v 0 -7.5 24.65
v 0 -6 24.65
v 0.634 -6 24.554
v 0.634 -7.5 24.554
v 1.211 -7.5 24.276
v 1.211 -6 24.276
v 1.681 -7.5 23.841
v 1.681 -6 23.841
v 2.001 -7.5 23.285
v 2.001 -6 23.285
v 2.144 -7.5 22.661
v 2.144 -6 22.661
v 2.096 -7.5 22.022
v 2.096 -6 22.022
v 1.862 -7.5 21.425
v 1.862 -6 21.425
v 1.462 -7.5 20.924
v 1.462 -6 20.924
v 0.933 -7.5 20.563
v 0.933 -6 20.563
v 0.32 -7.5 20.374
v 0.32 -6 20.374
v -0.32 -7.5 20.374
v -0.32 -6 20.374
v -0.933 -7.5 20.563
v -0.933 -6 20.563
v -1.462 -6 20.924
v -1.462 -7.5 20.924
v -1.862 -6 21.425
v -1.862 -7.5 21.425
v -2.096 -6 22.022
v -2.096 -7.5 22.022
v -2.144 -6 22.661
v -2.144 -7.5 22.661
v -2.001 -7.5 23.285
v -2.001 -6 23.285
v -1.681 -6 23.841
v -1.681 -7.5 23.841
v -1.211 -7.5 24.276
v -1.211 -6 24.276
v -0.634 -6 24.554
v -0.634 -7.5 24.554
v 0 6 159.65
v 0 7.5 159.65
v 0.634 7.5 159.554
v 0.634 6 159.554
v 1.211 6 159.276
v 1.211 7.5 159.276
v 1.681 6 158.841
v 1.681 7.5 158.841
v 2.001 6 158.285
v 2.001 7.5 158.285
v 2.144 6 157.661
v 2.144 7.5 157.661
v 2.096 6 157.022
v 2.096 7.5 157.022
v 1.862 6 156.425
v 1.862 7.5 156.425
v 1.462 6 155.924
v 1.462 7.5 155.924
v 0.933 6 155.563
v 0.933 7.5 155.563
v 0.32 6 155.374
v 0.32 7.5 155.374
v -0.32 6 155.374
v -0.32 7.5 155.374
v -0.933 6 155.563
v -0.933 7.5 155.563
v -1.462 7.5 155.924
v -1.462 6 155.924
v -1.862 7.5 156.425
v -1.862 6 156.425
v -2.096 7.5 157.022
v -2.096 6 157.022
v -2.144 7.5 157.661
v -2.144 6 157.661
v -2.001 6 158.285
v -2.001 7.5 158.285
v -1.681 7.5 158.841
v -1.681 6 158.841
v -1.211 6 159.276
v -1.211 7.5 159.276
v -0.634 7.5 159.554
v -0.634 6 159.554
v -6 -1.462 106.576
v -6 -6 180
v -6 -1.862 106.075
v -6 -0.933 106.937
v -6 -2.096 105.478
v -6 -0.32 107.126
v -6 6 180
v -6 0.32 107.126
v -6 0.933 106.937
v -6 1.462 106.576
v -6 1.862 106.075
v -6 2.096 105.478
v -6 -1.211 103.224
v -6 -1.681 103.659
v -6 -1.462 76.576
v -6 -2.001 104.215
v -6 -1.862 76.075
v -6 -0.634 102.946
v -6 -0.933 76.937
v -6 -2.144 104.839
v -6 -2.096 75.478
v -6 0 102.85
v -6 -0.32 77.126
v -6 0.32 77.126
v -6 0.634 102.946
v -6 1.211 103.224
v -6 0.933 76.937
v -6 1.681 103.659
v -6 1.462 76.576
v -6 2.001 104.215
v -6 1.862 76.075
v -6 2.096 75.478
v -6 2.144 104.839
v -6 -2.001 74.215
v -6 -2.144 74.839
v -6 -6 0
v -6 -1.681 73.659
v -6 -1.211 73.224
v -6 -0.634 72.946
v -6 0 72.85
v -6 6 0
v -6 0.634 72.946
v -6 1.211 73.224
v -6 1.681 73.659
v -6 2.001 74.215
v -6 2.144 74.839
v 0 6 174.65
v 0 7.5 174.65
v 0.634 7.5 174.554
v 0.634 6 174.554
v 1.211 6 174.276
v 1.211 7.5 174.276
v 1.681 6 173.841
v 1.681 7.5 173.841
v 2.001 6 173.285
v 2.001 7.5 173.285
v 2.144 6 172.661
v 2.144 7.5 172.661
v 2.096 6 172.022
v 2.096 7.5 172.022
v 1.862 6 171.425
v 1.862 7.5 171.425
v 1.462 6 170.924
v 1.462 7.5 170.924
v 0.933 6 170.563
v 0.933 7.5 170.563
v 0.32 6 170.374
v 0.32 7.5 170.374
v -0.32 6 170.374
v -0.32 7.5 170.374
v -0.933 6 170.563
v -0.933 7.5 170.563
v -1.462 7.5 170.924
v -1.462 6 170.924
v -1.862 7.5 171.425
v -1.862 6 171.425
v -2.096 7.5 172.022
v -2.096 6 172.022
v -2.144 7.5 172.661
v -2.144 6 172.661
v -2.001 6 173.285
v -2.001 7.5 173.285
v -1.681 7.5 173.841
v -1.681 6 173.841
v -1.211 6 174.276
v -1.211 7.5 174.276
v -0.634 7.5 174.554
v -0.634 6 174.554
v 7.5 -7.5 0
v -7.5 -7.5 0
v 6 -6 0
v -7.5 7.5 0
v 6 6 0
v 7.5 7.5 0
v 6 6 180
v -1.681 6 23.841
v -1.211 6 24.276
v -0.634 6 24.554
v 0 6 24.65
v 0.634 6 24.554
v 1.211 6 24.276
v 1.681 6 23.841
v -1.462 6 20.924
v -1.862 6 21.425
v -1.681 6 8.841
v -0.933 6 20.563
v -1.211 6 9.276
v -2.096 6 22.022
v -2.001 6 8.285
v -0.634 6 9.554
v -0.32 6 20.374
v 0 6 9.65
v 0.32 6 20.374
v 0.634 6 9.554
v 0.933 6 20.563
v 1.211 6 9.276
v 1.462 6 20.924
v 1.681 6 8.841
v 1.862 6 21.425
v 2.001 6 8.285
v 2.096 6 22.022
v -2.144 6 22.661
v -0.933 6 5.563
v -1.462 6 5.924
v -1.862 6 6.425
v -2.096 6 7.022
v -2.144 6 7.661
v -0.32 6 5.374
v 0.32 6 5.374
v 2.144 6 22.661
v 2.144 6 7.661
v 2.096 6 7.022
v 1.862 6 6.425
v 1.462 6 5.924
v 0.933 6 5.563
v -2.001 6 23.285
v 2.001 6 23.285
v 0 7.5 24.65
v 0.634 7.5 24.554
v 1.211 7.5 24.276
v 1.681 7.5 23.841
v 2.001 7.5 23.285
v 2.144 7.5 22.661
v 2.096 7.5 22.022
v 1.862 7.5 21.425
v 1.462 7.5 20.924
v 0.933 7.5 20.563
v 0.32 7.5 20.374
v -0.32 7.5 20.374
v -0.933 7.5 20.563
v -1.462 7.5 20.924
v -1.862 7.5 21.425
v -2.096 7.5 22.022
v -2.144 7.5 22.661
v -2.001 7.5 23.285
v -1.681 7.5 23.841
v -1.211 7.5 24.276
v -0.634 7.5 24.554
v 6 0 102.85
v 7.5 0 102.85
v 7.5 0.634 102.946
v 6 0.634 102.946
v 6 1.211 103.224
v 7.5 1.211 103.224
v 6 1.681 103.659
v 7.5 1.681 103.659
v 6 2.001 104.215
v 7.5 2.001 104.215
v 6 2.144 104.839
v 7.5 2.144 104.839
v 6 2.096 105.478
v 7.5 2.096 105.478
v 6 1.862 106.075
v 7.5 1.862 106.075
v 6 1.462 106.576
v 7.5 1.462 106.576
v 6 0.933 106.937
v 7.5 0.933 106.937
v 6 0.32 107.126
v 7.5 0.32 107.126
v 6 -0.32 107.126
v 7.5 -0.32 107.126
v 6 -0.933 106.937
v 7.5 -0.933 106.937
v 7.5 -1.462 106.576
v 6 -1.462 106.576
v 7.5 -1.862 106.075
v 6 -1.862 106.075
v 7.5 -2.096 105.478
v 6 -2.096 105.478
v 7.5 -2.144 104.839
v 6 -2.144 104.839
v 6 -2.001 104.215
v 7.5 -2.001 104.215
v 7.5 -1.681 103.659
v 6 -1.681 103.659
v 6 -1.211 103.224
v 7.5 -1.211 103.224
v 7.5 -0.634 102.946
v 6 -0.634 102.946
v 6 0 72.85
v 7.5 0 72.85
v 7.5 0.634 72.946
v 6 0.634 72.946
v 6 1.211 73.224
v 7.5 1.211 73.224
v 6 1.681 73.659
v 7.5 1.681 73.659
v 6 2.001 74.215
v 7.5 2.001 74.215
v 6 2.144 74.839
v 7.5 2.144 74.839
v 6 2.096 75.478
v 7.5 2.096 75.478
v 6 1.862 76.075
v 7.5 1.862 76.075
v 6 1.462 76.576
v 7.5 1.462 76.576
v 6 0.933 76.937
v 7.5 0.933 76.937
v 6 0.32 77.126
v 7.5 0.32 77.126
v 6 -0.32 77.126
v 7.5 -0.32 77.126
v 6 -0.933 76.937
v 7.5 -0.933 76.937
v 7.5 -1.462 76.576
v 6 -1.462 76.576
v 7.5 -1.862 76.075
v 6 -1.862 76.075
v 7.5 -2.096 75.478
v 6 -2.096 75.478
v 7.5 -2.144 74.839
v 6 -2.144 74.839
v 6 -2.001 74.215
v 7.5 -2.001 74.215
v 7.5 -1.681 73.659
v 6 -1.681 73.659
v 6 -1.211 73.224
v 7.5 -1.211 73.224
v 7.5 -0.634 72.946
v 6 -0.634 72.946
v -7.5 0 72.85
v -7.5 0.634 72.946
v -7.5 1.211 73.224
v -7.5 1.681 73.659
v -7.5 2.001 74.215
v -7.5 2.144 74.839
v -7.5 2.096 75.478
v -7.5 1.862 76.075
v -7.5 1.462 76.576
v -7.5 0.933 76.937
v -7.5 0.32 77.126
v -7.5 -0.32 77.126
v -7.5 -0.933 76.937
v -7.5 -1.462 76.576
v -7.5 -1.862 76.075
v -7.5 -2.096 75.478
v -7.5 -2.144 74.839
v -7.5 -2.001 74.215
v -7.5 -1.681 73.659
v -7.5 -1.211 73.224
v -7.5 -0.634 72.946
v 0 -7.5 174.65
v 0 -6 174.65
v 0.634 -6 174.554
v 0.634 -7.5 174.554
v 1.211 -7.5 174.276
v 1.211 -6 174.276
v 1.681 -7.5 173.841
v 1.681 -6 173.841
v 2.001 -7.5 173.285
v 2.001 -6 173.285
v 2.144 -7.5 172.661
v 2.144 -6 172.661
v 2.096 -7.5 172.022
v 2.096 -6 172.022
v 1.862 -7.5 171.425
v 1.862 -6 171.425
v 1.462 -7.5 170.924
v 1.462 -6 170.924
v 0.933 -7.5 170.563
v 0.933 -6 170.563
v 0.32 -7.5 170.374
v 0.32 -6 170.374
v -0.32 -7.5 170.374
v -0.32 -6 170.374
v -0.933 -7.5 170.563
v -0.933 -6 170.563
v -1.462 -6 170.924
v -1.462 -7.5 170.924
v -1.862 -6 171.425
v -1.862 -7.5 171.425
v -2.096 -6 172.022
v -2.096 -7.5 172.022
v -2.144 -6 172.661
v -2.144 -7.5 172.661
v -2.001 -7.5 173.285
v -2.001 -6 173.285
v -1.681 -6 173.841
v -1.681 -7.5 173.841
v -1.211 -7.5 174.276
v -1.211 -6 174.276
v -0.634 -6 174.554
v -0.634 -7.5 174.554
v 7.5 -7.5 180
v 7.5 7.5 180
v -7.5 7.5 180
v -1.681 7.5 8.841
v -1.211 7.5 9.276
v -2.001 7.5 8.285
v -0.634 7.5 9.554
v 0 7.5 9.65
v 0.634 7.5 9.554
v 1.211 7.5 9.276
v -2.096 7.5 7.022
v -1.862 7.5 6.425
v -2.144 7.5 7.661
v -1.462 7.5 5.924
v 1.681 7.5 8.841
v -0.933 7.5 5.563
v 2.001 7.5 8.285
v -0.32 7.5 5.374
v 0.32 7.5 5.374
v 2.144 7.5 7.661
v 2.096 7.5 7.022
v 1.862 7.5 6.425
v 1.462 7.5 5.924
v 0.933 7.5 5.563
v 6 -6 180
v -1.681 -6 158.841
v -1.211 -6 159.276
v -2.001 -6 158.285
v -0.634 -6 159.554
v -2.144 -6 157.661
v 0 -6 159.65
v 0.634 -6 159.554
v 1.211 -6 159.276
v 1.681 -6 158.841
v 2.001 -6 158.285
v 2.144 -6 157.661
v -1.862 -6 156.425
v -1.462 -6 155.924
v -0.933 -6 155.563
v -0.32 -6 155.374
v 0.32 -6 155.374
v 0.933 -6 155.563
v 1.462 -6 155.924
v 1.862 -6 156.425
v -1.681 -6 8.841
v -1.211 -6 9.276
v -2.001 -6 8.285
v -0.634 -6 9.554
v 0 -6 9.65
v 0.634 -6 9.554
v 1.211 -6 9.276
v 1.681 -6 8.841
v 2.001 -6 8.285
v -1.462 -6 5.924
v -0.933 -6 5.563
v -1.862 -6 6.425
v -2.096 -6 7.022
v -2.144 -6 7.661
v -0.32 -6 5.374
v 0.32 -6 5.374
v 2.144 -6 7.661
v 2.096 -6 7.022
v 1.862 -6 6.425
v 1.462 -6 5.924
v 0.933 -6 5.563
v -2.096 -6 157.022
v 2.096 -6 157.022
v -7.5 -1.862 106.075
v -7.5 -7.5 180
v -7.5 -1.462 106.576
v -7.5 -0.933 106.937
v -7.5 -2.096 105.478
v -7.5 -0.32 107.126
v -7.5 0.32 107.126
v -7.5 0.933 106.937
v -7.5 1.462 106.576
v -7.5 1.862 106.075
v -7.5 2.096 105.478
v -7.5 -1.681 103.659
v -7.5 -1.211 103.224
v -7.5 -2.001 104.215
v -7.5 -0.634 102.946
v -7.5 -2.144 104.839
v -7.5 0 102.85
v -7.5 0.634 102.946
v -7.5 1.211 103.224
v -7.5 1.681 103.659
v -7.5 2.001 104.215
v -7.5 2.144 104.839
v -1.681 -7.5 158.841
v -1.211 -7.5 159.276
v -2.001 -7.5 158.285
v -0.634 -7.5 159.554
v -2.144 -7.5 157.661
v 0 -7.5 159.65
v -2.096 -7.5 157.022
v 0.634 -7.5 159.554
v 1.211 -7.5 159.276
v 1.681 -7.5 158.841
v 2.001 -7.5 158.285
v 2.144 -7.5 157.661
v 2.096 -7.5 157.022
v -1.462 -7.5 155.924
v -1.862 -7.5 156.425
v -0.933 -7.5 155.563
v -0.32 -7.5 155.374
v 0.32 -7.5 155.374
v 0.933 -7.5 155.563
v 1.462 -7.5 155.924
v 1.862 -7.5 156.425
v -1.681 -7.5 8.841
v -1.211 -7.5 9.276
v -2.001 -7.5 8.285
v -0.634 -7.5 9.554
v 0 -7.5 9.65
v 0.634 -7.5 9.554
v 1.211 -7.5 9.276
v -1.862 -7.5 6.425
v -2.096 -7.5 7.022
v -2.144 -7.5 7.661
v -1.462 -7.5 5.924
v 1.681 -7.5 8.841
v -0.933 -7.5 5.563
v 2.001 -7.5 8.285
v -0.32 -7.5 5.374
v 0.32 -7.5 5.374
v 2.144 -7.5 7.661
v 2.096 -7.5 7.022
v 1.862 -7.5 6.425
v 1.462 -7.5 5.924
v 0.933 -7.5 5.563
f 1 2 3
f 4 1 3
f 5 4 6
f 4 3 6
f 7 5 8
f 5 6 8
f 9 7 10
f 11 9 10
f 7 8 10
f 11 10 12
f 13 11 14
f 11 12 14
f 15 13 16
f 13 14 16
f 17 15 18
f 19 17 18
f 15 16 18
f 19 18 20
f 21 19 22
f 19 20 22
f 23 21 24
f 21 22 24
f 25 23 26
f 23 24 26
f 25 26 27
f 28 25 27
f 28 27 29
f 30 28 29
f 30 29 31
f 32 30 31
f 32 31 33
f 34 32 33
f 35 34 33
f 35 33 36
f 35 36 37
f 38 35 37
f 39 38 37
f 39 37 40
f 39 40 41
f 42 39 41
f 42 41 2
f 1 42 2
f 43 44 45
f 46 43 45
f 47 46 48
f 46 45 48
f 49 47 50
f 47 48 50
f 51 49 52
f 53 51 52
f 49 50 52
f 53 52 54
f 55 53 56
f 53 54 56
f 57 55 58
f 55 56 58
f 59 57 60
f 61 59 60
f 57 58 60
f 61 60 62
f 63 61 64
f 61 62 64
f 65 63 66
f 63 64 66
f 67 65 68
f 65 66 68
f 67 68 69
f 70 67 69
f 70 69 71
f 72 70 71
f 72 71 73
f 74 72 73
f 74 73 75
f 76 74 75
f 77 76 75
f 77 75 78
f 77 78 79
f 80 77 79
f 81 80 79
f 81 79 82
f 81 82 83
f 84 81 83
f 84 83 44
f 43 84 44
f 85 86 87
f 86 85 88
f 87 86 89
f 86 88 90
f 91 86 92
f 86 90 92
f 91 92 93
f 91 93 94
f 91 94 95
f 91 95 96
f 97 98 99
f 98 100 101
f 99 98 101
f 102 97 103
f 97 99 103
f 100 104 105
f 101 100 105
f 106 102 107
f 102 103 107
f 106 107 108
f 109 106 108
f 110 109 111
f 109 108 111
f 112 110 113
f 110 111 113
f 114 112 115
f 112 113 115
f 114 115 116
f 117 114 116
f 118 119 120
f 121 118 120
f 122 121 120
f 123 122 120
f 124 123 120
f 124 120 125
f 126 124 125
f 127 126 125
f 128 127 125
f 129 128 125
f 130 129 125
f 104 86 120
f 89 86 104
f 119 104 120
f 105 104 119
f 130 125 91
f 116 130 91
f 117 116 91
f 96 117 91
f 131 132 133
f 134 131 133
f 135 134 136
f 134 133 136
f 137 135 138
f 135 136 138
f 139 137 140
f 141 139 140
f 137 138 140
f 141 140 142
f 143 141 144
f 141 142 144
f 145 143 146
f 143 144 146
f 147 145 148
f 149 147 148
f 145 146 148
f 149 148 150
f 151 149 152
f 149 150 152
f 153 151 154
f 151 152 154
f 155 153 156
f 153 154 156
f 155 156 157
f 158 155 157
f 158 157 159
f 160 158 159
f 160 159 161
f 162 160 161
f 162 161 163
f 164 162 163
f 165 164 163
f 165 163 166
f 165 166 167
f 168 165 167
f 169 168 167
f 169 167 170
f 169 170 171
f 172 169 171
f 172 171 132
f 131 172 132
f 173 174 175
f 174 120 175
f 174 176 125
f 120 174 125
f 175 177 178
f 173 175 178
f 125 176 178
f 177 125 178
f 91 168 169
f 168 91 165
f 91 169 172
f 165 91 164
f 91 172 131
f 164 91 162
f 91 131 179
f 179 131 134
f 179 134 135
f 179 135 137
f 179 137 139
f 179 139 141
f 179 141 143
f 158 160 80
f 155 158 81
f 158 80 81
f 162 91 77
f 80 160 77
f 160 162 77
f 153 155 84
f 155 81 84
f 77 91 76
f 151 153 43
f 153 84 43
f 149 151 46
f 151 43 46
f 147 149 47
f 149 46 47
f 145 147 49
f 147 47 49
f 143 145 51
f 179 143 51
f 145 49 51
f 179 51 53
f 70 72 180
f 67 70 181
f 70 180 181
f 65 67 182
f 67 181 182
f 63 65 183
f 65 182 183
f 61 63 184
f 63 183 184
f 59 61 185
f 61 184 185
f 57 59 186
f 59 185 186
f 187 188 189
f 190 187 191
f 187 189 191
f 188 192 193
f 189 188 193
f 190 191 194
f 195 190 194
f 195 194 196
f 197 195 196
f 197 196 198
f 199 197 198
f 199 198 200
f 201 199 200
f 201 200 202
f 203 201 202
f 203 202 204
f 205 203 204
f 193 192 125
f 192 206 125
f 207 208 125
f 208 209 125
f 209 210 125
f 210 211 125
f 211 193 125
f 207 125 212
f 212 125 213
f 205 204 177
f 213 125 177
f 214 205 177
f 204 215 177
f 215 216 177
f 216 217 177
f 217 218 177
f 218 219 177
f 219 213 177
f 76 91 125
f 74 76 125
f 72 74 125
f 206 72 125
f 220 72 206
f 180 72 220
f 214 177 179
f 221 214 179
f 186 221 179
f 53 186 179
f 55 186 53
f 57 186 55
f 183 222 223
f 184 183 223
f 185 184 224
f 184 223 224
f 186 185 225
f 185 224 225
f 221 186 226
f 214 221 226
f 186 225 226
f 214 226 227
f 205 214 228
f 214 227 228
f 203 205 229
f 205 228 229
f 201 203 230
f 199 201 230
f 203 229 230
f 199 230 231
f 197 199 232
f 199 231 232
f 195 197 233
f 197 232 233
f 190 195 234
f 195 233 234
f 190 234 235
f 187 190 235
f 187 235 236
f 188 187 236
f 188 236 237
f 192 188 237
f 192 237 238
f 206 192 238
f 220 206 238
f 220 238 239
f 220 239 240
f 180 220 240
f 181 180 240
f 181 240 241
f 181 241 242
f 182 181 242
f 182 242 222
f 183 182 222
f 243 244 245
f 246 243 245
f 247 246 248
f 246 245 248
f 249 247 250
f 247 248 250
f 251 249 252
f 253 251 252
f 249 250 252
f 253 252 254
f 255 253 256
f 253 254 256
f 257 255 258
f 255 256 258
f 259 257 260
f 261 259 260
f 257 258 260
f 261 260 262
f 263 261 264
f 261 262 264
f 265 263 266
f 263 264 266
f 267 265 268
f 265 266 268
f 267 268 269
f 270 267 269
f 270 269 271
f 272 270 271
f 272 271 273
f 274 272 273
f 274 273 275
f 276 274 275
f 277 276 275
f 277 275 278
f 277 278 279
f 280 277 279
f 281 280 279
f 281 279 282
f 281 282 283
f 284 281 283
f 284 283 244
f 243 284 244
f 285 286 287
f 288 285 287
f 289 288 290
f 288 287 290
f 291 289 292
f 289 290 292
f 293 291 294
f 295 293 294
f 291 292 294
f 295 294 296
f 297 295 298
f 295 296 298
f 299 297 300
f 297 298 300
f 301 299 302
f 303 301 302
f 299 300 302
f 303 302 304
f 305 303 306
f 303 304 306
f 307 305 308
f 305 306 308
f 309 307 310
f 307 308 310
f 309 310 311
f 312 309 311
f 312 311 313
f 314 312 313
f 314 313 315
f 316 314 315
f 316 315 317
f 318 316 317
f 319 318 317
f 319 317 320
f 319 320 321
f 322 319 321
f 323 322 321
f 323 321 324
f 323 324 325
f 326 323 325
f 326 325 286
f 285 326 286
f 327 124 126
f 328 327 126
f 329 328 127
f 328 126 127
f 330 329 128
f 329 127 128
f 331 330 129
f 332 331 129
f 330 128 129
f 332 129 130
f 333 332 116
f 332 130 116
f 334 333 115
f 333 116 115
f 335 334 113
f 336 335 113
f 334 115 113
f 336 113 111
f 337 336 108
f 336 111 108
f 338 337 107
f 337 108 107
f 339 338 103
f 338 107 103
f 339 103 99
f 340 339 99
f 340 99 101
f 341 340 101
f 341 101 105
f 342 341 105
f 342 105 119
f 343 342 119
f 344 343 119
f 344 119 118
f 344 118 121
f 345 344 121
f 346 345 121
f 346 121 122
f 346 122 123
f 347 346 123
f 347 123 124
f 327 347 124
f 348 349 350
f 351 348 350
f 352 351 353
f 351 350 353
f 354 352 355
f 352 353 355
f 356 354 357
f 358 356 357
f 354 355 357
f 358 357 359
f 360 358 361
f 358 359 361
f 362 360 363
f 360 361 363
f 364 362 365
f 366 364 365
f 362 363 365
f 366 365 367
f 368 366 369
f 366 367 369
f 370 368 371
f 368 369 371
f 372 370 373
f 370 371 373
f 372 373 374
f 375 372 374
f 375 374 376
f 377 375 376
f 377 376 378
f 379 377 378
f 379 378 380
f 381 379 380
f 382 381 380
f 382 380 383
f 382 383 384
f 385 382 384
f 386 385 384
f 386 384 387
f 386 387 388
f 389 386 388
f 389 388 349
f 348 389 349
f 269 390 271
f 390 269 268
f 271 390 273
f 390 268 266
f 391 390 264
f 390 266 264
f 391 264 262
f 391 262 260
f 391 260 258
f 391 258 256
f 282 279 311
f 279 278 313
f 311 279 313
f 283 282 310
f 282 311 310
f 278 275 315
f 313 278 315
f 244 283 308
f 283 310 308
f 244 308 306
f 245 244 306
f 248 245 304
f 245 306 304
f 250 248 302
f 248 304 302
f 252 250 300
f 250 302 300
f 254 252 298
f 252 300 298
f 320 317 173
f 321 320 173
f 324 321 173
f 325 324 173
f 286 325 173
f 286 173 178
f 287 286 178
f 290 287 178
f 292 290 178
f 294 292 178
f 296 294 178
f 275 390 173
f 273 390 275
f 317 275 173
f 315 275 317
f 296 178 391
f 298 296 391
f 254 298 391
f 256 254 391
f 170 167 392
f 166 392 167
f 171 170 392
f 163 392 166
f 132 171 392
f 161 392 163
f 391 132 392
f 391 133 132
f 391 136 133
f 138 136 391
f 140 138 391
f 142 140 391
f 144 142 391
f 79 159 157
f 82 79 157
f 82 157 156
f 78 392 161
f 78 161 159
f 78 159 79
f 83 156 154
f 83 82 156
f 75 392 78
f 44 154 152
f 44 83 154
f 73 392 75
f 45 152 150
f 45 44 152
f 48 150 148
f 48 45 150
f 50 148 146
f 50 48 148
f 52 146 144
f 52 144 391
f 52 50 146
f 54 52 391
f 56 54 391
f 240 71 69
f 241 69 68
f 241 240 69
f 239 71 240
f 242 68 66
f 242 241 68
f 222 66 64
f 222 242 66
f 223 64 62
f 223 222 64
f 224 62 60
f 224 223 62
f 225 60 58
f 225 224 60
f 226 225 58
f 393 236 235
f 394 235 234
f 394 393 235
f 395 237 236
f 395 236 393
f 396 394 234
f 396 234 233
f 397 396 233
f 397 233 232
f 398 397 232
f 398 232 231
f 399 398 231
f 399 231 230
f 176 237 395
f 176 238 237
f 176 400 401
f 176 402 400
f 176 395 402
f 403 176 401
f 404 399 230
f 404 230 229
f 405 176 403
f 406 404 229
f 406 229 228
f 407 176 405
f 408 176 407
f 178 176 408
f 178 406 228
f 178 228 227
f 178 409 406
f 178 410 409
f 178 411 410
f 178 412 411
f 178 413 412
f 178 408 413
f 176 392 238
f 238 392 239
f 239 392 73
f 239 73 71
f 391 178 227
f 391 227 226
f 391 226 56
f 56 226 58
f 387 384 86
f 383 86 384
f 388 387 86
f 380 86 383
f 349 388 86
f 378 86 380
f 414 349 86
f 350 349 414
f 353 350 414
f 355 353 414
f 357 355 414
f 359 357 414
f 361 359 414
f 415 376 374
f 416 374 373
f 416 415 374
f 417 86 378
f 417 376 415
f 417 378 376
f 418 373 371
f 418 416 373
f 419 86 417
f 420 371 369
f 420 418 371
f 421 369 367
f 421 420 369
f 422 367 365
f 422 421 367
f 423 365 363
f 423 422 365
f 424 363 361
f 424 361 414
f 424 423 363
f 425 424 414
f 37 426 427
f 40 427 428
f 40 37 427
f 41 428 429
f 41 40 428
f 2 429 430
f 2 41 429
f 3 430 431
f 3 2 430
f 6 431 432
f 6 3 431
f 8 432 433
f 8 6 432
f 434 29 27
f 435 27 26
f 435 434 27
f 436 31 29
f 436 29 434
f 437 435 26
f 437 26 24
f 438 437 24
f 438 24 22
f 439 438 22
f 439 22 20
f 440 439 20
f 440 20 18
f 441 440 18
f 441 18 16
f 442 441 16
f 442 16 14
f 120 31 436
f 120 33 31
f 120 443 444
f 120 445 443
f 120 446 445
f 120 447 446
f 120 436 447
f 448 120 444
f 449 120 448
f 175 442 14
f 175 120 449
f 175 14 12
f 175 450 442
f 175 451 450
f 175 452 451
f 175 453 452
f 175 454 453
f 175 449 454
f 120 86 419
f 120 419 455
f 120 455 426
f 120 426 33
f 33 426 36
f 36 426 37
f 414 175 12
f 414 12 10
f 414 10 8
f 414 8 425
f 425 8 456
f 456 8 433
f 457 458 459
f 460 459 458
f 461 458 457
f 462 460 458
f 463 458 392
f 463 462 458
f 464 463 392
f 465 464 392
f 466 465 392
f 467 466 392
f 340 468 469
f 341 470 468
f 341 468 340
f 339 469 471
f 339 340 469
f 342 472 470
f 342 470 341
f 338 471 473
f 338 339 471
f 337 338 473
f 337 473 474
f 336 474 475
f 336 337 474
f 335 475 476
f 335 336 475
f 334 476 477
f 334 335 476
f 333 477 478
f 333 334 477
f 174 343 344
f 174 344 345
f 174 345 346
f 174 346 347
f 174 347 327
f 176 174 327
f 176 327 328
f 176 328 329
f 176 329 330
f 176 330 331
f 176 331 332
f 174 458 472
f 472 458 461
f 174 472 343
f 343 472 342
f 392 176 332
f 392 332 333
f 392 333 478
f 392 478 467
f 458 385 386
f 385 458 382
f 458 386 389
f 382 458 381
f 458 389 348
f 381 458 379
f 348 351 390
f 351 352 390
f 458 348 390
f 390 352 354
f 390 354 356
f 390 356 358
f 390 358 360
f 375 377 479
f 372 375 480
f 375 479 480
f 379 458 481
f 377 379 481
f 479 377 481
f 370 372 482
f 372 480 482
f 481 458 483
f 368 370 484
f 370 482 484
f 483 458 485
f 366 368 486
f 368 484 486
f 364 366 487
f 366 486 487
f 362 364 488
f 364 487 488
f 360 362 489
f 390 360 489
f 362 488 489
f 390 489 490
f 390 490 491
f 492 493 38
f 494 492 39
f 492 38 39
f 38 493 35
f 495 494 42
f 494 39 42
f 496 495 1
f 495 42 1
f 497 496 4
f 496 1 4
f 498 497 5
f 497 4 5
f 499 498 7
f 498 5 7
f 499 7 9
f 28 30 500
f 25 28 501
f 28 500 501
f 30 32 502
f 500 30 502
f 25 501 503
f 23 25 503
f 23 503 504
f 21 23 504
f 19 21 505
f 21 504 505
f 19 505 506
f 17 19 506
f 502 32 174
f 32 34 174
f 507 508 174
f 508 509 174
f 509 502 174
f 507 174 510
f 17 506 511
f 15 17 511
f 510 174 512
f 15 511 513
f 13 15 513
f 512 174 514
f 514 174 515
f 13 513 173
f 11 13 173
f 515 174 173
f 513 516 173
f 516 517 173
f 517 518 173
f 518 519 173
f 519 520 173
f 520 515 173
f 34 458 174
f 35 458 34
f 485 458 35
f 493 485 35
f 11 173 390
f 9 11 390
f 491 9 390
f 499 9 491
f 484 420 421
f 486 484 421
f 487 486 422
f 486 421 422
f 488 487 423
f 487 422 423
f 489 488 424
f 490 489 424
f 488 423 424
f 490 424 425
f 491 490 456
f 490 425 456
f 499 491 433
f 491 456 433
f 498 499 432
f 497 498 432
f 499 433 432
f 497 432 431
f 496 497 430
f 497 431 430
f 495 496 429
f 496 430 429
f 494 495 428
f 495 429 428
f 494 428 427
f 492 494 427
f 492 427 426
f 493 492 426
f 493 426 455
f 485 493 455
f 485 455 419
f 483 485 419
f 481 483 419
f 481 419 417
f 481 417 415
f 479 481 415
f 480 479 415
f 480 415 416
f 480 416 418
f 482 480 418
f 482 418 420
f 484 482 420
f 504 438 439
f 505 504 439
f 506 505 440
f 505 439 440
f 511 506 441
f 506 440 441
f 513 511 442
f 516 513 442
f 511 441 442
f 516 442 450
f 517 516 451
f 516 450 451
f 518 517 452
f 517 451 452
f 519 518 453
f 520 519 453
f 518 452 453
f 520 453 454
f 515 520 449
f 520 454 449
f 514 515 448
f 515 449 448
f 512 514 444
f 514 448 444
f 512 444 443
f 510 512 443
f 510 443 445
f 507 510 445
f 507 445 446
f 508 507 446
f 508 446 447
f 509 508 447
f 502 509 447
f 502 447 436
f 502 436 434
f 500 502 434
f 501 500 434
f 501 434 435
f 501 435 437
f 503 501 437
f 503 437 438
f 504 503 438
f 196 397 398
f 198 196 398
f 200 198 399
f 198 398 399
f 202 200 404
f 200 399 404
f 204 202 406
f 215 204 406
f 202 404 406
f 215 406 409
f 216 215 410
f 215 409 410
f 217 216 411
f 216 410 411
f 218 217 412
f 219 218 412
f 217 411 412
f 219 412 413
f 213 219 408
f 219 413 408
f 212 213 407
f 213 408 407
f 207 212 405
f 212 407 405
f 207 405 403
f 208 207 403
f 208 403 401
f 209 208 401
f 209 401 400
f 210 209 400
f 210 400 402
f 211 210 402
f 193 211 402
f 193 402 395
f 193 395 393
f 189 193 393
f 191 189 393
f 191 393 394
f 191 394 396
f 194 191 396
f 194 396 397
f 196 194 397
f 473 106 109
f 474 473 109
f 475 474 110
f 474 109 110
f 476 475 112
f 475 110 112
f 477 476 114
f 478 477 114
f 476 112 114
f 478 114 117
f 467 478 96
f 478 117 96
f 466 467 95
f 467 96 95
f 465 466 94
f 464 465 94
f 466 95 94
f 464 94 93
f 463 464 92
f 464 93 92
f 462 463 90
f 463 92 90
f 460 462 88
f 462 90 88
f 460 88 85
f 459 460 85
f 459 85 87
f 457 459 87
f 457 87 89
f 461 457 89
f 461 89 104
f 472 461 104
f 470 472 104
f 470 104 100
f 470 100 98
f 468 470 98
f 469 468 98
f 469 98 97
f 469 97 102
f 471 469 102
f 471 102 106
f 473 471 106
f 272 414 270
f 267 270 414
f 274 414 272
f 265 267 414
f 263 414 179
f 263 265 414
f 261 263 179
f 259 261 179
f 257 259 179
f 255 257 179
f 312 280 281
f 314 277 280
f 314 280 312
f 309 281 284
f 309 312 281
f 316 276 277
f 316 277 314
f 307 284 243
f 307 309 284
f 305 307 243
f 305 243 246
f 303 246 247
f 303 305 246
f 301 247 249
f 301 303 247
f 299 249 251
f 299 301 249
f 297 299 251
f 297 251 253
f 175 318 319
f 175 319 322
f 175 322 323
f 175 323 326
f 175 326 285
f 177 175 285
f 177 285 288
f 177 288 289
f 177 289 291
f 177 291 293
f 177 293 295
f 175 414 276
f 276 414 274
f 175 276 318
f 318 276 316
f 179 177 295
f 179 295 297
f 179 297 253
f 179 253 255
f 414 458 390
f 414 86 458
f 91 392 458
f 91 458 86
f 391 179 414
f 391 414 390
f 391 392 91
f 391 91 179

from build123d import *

# Parameters (mm, degrees)
SKETCH_1_W          = 15
SKETCH_1_H          = 15
SKETCH_1_W_2        = 12
SKETCH_1_H_2        = 12
EXTRUDE_1_DEPTH     = 180
SKETCH_3_R          = 2.15
CUT_EXTRUDE_2_DEPTH = 181.779561898
SKETCH_4_R          = 2.15
CUT_EXTRUDE_3_DEPTH = 181.779561898


with BuildPart() as part:
    # ｽｹｯﾁ1 → 押し出し-薄板1 (new body)
    with BuildSketch(Plane.XY):
        Rectangle(SKETCH_1_W, SKETCH_1_H)
        Rectangle(SKETCH_1_W_2, SKETCH_1_H_2, mode=Mode.SUBTRACT)
    extrude(amount=EXTRUDE_1_DEPTH)

    # ｽｹｯﾁ3 → ｶｯﾄ - 押し出し2 (cut, through all)
    with BuildSketch(Plane(origin=(7.5, 0, 0), x_dir=(0, 0, -1), z_dir=(1, 0, 0))):
        with Locations((-75, 0)):
            Circle(SKETCH_3_R)
        with Locations((-105, 0)):
            Circle(SKETCH_3_R)
    extrude(amount=-CUT_EXTRUDE_2_DEPTH, mode=Mode.SUBTRACT)

    # ｽｹｯﾁ4 → ｶｯﾄ - 押し出し3 (cut, through all)
    with BuildSketch(Plane(origin=(0, 7.5, 0), x_dir=(1, 0, 0), z_dir=(0, 1, 0))):
        with Locations(Location((0, -7.5, 0), (0, 0, 270))):
            Circle(SKETCH_4_R)
        with Locations(Location((0, -22.5, 0), (0, 0, 270))):
            Circle(SKETCH_4_R)
        with Locations(Location((0, -172.5, 0), (0, 0, 270))):
            Circle(SKETCH_4_R)
        with Locations(Location((0, -157.5, 0), (0, 0, 270))):
            Circle(SKETCH_4_R)
    extrude(amount=-CUT_EXTRUDE_3_DEPTH, mode=Mode.SUBTRACT)


solid = part.part
